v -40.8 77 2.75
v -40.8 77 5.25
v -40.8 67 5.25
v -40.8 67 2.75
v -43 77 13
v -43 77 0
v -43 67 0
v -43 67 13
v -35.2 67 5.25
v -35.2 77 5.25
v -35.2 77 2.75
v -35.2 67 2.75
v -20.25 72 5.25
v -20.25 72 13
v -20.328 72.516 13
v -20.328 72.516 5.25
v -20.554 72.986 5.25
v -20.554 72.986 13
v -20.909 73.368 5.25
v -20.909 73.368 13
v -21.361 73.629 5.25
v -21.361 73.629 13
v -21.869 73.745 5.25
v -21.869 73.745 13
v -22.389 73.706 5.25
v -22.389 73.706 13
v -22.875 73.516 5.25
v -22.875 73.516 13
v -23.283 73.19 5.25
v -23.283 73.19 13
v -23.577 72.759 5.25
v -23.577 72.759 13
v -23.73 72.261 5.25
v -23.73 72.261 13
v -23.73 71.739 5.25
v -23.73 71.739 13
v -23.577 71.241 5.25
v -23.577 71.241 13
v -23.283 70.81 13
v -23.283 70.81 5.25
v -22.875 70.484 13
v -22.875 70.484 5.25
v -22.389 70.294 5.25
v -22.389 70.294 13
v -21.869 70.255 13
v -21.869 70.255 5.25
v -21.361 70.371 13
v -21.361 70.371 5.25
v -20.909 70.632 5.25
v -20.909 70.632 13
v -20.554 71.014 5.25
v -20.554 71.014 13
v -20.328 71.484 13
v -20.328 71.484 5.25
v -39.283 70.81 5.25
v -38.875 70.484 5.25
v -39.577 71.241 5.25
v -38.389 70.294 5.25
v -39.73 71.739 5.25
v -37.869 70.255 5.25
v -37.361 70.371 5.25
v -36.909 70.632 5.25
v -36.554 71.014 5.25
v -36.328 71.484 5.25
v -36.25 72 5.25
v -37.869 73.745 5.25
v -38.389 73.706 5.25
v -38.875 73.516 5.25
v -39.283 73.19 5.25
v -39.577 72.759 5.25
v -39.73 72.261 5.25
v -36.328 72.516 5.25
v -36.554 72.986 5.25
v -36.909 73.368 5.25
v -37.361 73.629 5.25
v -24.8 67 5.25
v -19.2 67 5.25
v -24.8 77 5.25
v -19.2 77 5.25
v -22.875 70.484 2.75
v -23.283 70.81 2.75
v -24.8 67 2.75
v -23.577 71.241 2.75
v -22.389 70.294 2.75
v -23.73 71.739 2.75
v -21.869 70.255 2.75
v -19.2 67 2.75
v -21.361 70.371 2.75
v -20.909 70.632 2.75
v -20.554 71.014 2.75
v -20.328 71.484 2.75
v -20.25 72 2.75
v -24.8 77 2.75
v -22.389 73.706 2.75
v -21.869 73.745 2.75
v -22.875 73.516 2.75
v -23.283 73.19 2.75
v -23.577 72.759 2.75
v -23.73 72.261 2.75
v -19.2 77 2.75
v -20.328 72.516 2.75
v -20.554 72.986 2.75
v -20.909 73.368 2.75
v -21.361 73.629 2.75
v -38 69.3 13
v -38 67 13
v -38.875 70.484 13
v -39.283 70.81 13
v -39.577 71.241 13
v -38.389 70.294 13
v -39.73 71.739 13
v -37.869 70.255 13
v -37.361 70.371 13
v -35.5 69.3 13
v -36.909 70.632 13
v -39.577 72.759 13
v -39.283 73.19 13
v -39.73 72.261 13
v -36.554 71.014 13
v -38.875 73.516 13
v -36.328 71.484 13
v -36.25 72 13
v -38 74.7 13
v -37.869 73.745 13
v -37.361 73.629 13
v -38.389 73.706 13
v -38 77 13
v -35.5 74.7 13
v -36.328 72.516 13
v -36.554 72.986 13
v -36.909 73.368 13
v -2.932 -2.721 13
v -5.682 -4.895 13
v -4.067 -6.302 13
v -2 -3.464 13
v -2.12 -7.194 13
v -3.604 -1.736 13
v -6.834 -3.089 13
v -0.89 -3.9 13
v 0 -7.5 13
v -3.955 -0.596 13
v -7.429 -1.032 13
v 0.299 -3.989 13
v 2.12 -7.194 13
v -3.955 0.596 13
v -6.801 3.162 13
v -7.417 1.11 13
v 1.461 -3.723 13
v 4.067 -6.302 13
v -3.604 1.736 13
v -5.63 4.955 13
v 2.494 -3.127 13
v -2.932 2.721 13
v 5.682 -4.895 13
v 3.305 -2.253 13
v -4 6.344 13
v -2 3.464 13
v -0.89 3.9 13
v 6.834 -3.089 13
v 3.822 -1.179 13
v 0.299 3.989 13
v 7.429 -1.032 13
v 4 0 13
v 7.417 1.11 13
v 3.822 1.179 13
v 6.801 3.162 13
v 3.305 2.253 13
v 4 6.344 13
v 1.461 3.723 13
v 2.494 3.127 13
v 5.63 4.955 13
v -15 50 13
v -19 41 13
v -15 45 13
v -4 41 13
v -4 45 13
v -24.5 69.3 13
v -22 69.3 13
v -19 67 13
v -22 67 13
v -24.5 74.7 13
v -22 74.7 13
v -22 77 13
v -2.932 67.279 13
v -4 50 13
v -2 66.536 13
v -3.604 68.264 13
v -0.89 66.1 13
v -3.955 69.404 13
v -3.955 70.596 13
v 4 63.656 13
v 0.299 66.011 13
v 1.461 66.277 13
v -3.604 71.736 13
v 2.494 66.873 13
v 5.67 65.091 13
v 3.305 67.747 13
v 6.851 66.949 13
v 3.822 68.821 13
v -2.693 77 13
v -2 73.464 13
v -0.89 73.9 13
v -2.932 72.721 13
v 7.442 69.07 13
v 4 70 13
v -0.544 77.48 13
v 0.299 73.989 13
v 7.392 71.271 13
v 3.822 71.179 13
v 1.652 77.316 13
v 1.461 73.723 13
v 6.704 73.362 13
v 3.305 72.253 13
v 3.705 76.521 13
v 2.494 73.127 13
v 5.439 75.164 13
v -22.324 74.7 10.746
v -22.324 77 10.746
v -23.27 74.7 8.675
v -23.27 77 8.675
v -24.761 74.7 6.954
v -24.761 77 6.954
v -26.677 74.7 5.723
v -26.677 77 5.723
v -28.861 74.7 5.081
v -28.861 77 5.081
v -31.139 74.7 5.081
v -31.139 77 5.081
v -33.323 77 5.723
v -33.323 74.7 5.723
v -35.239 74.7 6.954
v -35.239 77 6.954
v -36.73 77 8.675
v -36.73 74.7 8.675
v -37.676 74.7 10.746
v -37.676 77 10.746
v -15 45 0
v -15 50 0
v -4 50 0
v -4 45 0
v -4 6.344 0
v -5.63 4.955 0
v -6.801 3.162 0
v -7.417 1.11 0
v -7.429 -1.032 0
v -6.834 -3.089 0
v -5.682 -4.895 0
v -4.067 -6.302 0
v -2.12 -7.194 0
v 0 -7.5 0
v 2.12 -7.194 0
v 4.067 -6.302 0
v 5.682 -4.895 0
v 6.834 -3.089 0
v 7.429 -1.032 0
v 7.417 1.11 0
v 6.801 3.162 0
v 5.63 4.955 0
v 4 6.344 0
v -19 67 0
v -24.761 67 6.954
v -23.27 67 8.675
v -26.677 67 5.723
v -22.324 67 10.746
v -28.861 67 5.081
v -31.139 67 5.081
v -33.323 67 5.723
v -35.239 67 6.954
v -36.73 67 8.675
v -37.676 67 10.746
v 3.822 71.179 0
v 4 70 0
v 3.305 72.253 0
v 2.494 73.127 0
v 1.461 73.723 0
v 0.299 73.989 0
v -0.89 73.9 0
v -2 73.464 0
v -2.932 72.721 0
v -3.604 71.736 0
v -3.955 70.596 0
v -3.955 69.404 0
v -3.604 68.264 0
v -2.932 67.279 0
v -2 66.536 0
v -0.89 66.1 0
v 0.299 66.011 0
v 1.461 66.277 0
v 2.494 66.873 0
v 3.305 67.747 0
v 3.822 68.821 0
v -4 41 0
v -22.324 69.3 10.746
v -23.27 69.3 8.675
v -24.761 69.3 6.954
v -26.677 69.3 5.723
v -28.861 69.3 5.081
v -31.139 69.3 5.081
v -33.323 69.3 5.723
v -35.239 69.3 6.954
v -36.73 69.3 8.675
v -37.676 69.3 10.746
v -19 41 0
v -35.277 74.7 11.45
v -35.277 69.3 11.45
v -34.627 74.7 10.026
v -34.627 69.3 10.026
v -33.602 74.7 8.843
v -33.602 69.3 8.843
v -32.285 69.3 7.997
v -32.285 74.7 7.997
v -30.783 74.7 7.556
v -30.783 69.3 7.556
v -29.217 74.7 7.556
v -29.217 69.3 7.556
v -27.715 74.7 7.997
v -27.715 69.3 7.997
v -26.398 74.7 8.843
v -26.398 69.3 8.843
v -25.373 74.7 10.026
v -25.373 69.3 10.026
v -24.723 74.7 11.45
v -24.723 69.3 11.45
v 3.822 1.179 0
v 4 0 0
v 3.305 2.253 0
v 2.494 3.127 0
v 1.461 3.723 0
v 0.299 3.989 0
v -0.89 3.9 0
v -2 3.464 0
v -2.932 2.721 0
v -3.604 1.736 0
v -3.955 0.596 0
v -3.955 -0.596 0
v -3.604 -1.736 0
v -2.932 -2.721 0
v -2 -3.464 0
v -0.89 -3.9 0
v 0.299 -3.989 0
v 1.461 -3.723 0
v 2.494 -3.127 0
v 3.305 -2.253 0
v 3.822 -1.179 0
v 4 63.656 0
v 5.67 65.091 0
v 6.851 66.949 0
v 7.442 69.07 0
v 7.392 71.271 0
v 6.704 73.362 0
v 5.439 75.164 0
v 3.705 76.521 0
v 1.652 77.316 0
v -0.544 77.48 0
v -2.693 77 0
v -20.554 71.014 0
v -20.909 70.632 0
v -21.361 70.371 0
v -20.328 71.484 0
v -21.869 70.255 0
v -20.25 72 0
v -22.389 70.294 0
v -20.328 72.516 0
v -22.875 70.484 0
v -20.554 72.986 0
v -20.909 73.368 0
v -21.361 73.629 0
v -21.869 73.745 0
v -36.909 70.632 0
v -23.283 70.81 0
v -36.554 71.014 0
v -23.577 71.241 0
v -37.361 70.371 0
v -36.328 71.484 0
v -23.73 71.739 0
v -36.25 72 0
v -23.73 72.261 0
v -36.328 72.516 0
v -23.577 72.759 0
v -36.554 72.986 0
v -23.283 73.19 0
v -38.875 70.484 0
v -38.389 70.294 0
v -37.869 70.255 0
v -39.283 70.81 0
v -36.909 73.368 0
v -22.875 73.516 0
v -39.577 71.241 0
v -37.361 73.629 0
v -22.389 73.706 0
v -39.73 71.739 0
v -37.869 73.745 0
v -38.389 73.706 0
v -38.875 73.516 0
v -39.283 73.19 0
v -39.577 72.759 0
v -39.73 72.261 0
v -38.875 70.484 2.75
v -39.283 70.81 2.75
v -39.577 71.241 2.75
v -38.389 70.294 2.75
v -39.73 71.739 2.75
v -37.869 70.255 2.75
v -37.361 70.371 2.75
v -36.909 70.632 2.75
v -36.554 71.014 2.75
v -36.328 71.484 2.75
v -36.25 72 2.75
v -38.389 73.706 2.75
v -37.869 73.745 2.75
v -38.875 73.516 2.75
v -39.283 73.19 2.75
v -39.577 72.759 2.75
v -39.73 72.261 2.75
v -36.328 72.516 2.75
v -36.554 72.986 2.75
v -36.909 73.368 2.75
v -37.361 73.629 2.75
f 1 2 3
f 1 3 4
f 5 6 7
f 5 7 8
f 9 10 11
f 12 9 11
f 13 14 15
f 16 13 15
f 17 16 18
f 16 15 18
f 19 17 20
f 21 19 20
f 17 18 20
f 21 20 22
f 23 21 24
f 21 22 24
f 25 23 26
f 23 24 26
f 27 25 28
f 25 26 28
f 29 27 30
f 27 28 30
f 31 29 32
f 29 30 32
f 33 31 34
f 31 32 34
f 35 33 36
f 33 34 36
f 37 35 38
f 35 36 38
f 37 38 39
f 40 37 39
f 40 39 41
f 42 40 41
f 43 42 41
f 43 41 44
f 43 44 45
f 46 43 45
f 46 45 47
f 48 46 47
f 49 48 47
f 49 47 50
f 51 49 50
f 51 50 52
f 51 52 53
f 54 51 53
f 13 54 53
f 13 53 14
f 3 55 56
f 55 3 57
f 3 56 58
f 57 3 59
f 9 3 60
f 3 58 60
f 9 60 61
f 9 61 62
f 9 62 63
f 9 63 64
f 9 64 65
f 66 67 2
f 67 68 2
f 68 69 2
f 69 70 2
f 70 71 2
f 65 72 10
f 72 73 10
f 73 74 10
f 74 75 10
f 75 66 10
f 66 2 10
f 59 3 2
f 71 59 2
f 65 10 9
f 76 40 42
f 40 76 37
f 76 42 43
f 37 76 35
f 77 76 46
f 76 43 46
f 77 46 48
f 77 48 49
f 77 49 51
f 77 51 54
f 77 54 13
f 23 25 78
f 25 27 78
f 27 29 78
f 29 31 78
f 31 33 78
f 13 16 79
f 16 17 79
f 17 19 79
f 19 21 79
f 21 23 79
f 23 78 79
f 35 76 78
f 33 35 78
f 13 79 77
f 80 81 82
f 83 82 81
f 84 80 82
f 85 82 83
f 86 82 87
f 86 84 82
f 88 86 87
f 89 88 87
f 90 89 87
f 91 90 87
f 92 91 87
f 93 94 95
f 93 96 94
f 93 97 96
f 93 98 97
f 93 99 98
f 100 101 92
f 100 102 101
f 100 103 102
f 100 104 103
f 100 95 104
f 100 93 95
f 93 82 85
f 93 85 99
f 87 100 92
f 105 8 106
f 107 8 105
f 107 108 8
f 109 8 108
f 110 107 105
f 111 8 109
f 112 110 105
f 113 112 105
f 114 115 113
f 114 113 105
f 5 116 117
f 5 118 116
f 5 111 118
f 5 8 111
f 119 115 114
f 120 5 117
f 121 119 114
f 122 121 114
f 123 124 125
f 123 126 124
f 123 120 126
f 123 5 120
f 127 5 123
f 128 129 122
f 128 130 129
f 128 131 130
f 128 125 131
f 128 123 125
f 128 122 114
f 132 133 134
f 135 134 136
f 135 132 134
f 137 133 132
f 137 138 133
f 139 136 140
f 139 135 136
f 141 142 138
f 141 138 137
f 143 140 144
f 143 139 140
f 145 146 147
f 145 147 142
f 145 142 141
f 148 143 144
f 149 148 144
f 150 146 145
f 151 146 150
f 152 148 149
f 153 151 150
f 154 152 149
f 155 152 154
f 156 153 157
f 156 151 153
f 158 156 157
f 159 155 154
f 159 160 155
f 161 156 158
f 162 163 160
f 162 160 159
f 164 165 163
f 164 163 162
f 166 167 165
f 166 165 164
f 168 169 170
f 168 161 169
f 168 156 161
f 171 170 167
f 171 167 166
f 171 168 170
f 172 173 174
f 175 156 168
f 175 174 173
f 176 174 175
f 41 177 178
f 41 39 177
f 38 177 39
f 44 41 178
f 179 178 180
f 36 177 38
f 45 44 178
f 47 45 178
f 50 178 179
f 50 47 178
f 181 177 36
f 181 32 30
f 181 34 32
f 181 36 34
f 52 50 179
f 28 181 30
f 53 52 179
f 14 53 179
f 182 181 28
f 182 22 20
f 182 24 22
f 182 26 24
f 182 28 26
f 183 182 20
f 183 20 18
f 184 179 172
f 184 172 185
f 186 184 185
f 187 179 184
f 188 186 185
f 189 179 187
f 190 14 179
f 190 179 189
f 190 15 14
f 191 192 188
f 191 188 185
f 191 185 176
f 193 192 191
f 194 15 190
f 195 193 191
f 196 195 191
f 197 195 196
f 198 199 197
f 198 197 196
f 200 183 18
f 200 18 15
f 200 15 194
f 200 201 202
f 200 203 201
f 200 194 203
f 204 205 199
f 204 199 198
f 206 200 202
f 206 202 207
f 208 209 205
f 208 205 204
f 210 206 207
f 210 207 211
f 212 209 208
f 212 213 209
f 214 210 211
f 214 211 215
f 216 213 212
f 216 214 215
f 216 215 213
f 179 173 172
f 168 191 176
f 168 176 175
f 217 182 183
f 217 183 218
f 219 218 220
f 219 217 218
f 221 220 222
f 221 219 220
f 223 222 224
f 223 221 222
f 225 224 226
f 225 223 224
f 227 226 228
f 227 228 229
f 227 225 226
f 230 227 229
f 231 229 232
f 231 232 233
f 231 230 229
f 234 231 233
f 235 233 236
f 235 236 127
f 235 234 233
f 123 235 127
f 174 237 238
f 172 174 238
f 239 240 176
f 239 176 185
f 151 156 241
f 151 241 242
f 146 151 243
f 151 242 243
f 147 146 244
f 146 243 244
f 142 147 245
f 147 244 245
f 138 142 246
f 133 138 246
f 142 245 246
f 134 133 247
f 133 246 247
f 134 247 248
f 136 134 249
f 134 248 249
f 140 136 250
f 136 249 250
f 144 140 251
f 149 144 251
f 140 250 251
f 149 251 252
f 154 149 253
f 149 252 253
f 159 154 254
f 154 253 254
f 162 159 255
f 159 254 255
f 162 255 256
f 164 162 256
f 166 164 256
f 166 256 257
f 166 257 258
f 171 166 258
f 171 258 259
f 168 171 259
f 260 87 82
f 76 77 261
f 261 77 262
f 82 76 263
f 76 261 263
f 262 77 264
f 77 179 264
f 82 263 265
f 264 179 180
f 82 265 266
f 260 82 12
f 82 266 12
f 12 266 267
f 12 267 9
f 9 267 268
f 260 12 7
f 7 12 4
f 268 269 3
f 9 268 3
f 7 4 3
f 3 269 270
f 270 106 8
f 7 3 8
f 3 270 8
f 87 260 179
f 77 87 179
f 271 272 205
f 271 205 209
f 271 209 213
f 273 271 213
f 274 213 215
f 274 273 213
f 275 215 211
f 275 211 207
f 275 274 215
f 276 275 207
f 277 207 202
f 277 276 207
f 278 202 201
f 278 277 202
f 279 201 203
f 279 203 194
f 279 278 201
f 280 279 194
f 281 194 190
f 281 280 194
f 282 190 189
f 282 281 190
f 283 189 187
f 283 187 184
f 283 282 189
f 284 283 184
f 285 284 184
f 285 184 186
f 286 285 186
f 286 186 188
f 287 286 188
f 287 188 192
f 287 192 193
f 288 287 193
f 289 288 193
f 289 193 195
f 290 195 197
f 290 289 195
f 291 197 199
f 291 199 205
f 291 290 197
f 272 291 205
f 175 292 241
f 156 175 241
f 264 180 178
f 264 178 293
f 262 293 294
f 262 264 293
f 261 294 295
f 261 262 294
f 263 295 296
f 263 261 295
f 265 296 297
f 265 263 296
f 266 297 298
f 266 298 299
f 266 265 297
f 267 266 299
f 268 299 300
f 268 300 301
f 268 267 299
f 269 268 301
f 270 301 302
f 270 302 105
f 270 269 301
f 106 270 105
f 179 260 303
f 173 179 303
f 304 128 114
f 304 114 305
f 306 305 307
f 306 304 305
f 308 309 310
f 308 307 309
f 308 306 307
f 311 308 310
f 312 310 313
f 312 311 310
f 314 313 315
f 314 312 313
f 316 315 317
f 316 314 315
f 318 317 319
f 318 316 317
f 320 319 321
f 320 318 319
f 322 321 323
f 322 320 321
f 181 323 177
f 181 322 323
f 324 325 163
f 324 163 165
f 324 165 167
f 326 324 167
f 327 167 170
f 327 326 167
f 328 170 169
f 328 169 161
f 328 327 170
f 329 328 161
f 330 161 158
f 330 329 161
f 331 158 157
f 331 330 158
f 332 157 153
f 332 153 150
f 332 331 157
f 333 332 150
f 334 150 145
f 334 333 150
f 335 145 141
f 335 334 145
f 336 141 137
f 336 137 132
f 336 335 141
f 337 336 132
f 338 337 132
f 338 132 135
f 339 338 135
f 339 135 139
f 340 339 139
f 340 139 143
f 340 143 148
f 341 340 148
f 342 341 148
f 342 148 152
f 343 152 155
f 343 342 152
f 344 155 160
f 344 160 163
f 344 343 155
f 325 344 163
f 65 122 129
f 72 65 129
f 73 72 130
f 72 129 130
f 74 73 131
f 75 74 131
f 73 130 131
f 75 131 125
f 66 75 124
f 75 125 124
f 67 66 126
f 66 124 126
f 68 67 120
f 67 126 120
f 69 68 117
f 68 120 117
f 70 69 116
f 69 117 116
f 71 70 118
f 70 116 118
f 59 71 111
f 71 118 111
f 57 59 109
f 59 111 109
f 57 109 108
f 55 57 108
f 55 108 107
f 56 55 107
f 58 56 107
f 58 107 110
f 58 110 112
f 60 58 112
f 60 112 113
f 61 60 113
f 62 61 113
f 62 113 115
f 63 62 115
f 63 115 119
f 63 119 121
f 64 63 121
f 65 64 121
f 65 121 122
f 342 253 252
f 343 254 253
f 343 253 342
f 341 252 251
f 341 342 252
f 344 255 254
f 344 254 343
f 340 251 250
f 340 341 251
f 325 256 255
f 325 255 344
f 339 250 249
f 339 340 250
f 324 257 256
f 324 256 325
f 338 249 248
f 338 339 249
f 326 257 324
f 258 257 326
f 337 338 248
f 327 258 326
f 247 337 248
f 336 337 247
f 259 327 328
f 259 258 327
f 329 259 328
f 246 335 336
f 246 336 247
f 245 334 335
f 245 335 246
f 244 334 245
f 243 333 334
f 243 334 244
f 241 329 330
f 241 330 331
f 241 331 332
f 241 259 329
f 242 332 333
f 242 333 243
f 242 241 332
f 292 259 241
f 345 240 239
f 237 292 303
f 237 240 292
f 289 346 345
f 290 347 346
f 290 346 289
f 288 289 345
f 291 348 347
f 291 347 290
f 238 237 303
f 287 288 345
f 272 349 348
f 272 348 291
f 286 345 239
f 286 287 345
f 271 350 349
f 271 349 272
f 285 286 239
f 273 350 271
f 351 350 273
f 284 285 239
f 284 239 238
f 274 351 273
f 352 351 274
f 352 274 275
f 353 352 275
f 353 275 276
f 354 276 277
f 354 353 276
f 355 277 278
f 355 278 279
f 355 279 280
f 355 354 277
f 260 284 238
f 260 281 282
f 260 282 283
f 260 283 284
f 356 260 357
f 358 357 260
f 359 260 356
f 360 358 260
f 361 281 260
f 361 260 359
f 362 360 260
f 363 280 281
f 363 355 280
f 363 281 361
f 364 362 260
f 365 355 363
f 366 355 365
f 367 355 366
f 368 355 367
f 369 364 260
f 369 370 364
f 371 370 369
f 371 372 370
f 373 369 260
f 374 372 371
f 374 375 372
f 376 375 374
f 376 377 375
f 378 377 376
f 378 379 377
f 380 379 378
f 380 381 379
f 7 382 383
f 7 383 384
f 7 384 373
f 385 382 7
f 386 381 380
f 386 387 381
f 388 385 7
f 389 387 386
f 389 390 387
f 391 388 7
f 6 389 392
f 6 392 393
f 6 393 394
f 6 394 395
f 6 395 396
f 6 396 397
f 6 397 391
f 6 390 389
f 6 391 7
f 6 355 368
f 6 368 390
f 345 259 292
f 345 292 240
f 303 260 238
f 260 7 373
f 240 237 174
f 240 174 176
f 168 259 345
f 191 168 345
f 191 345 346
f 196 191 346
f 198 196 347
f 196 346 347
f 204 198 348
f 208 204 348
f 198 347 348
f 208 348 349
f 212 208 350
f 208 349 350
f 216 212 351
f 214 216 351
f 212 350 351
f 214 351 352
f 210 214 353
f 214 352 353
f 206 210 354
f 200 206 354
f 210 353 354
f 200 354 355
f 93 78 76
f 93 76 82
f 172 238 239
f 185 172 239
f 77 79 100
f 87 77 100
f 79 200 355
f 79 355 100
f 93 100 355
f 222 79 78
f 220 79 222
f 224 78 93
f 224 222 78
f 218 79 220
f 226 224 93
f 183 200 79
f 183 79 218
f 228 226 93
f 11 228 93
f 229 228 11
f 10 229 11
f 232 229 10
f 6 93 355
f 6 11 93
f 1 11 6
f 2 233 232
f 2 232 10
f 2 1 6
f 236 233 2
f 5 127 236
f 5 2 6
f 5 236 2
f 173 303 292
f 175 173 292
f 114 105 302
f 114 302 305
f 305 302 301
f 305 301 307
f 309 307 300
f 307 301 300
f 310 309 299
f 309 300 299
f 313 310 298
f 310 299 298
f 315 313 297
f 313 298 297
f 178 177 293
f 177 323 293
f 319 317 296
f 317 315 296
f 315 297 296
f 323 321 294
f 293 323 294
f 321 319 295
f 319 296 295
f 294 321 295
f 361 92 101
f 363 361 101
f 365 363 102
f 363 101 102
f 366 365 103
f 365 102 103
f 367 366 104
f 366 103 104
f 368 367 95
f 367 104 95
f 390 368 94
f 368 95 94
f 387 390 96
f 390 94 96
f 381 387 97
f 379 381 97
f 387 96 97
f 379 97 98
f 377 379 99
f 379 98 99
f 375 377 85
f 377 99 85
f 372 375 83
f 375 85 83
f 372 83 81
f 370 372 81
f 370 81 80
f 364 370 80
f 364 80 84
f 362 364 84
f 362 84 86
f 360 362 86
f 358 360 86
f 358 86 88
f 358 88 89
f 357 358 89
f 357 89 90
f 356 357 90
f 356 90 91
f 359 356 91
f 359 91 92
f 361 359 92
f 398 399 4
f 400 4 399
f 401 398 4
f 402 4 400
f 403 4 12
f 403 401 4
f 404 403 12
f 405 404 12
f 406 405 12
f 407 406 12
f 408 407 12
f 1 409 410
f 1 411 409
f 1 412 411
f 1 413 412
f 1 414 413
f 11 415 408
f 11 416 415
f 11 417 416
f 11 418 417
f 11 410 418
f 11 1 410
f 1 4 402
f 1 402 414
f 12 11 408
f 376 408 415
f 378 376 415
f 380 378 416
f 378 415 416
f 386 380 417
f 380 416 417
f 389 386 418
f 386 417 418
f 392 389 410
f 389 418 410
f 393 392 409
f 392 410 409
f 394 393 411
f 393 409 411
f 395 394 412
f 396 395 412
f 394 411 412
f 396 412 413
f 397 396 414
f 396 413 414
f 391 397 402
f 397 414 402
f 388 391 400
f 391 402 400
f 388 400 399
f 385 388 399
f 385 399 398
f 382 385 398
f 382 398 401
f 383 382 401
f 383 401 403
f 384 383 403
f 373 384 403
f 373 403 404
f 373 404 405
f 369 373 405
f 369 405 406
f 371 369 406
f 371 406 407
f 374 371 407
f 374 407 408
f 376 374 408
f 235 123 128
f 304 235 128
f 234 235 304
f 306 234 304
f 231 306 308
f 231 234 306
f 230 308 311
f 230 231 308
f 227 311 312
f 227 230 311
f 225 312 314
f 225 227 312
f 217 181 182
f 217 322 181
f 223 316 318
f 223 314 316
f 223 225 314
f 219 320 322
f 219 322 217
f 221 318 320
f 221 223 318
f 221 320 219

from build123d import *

# Parameters (mm, degrees)
ESBO_O1_R                = 4
ESBO_O1_W                = 11
ESBO_O1_H                = 5
RESSALTO_EXTRUS_O1_DEPTH = 13
RESSALTO_EXTRUS_O3_START = -36
RESSALTO_EXTRUS_O3_DEPTH = 10
CORTE_EXTRUS_O2_START    = -10
ESBO_O7_R                = 8
CORTE_EXTRUS_O2_DEPTH    = 2.3
CORTE_EXTRUS_O3_START    = -2.3
ESBO_O7_2_R              = 8
CORTE_EXTRUS_O3_DEPTH    = 2.3
ESBO_O8_W                = 5.6
ESBO_O8_H                = 2.5
CORTE_EXTRUS_O4_DEPTH    = 10
ESBO_O9_R                = 1.75
CORTE_EXTRUS_O5_DEPTH    = 90.578178146


with BuildPart() as part:
    # Esboço1 → Ressalto-extrusão1 (new body)
    with BuildSketch(Plane.XY):
        with BuildLine():
            Line((4, 63.65571123), (4, 6.34428877))
            ThreePointArc((4, 6.34428877), (0, -7.5), (-4, 6.34428877))
            Line((-4, 6.34428877), (-4, 41))
            Line((-4, 41), (-19, 41))
            Line((-19, 41), (-19, 53))
            Line((-19, 53), (-19, 77))
            Line((-19, 77), (-2.692582404, 77))
            ThreePointArc((-2.692582404, 77), (6.704091727, 73.362313803), (4, 63.65571123))
        make_face()
        with Locations((0, 70)):
            Circle(ESBO_O1_R, mode=Mode.SUBTRACT)
        Circle(ESBO_O1_R, mode=Mode.SUBTRACT)
        with Locations((-9.5, 47.5)):
            Rectangle(ESBO_O1_W, ESBO_O1_H, mode=Mode.SUBTRACT)
    extrude(amount=RESSALTO_EXTRUS_O1_DEPTH)

    # Esboço5 → Ressalto-extrusão3 (add)
    with BuildSketch(Plane.XZ.offset(-41).offset(RESSALTO_EXTRUS_O3_START)):
        with BuildLine():
            Line((-21, 13), (-19, 13))
            Line((-19, 13), (-19, 0))
            Line((-19, 0), (-43, 0))
            Line((-43, 0), (-43, 13))
            Line((-43, 13), (-35.5, 13))
            ThreePointArc((-35.5, 13), (-30, 7.5), (-24.5, 13))
            Line((-24.5, 13), (-21, 13))
        make_face()
    extrude(amount=RESSALTO_EXTRUS_O3_DEPTH)

    # Esboço7 → Corte-extrusão2 (cut)
    with BuildSketch(Plane(origin=(0, 77, 0), x_dir=(1, 0, 0), z_dir=(0, 1, 0)).offset(CORTE_EXTRUS_O2_START)):
        with Locations((-30, -13)):
            Circle(ESBO_O7_R)
    extrude(amount=CORTE_EXTRUS_O2_DEPTH, mode=Mode.SUBTRACT)

    # Esboço7<2> → Corte-extrusão3 (cut)
    with BuildSketch(Plane(origin=(0, 77, 0), x_dir=(1, 0, 0), z_dir=(0, 1, 0)).offset(CORTE_EXTRUS_O3_START)):
        with Locations((-30, -13)):
            Circle(ESBO_O7_2_R)
    extrude(amount=CORTE_EXTRUS_O3_DEPTH, mode=Mode.SUBTRACT)

    # Esboço8 → Corte-extrusão4 (cut)
    with BuildSketch(Plane(origin=(0, 77, 0), x_dir=(1, 0, 0), z_dir=(0, 1, 0))):
        with Locations((-38, -4)):
            Rectangle(ESBO_O8_W, ESBO_O8_H)
        with Locations((-22, -4)):
            Rectangle(ESBO_O8_W, ESBO_O8_H)
    extrude(amount=-CORTE_EXTRUS_O4_DEPTH, mode=Mode.SUBTRACT)

    # Esboço9 → Corte-extrusão5 (cut, through all)
    with BuildSketch(Plane.XY.offset(13)):
        with Locations((-38, 72)):
            Circle(ESBO_O9_R)
        with Locations((-22, 72)):
            Circle(ESBO_O9_R)
    extrude(amount=-CORTE_EXTRUS_O5_DEPTH, mode=Mode.SUBTRACT)


solid = part.part
